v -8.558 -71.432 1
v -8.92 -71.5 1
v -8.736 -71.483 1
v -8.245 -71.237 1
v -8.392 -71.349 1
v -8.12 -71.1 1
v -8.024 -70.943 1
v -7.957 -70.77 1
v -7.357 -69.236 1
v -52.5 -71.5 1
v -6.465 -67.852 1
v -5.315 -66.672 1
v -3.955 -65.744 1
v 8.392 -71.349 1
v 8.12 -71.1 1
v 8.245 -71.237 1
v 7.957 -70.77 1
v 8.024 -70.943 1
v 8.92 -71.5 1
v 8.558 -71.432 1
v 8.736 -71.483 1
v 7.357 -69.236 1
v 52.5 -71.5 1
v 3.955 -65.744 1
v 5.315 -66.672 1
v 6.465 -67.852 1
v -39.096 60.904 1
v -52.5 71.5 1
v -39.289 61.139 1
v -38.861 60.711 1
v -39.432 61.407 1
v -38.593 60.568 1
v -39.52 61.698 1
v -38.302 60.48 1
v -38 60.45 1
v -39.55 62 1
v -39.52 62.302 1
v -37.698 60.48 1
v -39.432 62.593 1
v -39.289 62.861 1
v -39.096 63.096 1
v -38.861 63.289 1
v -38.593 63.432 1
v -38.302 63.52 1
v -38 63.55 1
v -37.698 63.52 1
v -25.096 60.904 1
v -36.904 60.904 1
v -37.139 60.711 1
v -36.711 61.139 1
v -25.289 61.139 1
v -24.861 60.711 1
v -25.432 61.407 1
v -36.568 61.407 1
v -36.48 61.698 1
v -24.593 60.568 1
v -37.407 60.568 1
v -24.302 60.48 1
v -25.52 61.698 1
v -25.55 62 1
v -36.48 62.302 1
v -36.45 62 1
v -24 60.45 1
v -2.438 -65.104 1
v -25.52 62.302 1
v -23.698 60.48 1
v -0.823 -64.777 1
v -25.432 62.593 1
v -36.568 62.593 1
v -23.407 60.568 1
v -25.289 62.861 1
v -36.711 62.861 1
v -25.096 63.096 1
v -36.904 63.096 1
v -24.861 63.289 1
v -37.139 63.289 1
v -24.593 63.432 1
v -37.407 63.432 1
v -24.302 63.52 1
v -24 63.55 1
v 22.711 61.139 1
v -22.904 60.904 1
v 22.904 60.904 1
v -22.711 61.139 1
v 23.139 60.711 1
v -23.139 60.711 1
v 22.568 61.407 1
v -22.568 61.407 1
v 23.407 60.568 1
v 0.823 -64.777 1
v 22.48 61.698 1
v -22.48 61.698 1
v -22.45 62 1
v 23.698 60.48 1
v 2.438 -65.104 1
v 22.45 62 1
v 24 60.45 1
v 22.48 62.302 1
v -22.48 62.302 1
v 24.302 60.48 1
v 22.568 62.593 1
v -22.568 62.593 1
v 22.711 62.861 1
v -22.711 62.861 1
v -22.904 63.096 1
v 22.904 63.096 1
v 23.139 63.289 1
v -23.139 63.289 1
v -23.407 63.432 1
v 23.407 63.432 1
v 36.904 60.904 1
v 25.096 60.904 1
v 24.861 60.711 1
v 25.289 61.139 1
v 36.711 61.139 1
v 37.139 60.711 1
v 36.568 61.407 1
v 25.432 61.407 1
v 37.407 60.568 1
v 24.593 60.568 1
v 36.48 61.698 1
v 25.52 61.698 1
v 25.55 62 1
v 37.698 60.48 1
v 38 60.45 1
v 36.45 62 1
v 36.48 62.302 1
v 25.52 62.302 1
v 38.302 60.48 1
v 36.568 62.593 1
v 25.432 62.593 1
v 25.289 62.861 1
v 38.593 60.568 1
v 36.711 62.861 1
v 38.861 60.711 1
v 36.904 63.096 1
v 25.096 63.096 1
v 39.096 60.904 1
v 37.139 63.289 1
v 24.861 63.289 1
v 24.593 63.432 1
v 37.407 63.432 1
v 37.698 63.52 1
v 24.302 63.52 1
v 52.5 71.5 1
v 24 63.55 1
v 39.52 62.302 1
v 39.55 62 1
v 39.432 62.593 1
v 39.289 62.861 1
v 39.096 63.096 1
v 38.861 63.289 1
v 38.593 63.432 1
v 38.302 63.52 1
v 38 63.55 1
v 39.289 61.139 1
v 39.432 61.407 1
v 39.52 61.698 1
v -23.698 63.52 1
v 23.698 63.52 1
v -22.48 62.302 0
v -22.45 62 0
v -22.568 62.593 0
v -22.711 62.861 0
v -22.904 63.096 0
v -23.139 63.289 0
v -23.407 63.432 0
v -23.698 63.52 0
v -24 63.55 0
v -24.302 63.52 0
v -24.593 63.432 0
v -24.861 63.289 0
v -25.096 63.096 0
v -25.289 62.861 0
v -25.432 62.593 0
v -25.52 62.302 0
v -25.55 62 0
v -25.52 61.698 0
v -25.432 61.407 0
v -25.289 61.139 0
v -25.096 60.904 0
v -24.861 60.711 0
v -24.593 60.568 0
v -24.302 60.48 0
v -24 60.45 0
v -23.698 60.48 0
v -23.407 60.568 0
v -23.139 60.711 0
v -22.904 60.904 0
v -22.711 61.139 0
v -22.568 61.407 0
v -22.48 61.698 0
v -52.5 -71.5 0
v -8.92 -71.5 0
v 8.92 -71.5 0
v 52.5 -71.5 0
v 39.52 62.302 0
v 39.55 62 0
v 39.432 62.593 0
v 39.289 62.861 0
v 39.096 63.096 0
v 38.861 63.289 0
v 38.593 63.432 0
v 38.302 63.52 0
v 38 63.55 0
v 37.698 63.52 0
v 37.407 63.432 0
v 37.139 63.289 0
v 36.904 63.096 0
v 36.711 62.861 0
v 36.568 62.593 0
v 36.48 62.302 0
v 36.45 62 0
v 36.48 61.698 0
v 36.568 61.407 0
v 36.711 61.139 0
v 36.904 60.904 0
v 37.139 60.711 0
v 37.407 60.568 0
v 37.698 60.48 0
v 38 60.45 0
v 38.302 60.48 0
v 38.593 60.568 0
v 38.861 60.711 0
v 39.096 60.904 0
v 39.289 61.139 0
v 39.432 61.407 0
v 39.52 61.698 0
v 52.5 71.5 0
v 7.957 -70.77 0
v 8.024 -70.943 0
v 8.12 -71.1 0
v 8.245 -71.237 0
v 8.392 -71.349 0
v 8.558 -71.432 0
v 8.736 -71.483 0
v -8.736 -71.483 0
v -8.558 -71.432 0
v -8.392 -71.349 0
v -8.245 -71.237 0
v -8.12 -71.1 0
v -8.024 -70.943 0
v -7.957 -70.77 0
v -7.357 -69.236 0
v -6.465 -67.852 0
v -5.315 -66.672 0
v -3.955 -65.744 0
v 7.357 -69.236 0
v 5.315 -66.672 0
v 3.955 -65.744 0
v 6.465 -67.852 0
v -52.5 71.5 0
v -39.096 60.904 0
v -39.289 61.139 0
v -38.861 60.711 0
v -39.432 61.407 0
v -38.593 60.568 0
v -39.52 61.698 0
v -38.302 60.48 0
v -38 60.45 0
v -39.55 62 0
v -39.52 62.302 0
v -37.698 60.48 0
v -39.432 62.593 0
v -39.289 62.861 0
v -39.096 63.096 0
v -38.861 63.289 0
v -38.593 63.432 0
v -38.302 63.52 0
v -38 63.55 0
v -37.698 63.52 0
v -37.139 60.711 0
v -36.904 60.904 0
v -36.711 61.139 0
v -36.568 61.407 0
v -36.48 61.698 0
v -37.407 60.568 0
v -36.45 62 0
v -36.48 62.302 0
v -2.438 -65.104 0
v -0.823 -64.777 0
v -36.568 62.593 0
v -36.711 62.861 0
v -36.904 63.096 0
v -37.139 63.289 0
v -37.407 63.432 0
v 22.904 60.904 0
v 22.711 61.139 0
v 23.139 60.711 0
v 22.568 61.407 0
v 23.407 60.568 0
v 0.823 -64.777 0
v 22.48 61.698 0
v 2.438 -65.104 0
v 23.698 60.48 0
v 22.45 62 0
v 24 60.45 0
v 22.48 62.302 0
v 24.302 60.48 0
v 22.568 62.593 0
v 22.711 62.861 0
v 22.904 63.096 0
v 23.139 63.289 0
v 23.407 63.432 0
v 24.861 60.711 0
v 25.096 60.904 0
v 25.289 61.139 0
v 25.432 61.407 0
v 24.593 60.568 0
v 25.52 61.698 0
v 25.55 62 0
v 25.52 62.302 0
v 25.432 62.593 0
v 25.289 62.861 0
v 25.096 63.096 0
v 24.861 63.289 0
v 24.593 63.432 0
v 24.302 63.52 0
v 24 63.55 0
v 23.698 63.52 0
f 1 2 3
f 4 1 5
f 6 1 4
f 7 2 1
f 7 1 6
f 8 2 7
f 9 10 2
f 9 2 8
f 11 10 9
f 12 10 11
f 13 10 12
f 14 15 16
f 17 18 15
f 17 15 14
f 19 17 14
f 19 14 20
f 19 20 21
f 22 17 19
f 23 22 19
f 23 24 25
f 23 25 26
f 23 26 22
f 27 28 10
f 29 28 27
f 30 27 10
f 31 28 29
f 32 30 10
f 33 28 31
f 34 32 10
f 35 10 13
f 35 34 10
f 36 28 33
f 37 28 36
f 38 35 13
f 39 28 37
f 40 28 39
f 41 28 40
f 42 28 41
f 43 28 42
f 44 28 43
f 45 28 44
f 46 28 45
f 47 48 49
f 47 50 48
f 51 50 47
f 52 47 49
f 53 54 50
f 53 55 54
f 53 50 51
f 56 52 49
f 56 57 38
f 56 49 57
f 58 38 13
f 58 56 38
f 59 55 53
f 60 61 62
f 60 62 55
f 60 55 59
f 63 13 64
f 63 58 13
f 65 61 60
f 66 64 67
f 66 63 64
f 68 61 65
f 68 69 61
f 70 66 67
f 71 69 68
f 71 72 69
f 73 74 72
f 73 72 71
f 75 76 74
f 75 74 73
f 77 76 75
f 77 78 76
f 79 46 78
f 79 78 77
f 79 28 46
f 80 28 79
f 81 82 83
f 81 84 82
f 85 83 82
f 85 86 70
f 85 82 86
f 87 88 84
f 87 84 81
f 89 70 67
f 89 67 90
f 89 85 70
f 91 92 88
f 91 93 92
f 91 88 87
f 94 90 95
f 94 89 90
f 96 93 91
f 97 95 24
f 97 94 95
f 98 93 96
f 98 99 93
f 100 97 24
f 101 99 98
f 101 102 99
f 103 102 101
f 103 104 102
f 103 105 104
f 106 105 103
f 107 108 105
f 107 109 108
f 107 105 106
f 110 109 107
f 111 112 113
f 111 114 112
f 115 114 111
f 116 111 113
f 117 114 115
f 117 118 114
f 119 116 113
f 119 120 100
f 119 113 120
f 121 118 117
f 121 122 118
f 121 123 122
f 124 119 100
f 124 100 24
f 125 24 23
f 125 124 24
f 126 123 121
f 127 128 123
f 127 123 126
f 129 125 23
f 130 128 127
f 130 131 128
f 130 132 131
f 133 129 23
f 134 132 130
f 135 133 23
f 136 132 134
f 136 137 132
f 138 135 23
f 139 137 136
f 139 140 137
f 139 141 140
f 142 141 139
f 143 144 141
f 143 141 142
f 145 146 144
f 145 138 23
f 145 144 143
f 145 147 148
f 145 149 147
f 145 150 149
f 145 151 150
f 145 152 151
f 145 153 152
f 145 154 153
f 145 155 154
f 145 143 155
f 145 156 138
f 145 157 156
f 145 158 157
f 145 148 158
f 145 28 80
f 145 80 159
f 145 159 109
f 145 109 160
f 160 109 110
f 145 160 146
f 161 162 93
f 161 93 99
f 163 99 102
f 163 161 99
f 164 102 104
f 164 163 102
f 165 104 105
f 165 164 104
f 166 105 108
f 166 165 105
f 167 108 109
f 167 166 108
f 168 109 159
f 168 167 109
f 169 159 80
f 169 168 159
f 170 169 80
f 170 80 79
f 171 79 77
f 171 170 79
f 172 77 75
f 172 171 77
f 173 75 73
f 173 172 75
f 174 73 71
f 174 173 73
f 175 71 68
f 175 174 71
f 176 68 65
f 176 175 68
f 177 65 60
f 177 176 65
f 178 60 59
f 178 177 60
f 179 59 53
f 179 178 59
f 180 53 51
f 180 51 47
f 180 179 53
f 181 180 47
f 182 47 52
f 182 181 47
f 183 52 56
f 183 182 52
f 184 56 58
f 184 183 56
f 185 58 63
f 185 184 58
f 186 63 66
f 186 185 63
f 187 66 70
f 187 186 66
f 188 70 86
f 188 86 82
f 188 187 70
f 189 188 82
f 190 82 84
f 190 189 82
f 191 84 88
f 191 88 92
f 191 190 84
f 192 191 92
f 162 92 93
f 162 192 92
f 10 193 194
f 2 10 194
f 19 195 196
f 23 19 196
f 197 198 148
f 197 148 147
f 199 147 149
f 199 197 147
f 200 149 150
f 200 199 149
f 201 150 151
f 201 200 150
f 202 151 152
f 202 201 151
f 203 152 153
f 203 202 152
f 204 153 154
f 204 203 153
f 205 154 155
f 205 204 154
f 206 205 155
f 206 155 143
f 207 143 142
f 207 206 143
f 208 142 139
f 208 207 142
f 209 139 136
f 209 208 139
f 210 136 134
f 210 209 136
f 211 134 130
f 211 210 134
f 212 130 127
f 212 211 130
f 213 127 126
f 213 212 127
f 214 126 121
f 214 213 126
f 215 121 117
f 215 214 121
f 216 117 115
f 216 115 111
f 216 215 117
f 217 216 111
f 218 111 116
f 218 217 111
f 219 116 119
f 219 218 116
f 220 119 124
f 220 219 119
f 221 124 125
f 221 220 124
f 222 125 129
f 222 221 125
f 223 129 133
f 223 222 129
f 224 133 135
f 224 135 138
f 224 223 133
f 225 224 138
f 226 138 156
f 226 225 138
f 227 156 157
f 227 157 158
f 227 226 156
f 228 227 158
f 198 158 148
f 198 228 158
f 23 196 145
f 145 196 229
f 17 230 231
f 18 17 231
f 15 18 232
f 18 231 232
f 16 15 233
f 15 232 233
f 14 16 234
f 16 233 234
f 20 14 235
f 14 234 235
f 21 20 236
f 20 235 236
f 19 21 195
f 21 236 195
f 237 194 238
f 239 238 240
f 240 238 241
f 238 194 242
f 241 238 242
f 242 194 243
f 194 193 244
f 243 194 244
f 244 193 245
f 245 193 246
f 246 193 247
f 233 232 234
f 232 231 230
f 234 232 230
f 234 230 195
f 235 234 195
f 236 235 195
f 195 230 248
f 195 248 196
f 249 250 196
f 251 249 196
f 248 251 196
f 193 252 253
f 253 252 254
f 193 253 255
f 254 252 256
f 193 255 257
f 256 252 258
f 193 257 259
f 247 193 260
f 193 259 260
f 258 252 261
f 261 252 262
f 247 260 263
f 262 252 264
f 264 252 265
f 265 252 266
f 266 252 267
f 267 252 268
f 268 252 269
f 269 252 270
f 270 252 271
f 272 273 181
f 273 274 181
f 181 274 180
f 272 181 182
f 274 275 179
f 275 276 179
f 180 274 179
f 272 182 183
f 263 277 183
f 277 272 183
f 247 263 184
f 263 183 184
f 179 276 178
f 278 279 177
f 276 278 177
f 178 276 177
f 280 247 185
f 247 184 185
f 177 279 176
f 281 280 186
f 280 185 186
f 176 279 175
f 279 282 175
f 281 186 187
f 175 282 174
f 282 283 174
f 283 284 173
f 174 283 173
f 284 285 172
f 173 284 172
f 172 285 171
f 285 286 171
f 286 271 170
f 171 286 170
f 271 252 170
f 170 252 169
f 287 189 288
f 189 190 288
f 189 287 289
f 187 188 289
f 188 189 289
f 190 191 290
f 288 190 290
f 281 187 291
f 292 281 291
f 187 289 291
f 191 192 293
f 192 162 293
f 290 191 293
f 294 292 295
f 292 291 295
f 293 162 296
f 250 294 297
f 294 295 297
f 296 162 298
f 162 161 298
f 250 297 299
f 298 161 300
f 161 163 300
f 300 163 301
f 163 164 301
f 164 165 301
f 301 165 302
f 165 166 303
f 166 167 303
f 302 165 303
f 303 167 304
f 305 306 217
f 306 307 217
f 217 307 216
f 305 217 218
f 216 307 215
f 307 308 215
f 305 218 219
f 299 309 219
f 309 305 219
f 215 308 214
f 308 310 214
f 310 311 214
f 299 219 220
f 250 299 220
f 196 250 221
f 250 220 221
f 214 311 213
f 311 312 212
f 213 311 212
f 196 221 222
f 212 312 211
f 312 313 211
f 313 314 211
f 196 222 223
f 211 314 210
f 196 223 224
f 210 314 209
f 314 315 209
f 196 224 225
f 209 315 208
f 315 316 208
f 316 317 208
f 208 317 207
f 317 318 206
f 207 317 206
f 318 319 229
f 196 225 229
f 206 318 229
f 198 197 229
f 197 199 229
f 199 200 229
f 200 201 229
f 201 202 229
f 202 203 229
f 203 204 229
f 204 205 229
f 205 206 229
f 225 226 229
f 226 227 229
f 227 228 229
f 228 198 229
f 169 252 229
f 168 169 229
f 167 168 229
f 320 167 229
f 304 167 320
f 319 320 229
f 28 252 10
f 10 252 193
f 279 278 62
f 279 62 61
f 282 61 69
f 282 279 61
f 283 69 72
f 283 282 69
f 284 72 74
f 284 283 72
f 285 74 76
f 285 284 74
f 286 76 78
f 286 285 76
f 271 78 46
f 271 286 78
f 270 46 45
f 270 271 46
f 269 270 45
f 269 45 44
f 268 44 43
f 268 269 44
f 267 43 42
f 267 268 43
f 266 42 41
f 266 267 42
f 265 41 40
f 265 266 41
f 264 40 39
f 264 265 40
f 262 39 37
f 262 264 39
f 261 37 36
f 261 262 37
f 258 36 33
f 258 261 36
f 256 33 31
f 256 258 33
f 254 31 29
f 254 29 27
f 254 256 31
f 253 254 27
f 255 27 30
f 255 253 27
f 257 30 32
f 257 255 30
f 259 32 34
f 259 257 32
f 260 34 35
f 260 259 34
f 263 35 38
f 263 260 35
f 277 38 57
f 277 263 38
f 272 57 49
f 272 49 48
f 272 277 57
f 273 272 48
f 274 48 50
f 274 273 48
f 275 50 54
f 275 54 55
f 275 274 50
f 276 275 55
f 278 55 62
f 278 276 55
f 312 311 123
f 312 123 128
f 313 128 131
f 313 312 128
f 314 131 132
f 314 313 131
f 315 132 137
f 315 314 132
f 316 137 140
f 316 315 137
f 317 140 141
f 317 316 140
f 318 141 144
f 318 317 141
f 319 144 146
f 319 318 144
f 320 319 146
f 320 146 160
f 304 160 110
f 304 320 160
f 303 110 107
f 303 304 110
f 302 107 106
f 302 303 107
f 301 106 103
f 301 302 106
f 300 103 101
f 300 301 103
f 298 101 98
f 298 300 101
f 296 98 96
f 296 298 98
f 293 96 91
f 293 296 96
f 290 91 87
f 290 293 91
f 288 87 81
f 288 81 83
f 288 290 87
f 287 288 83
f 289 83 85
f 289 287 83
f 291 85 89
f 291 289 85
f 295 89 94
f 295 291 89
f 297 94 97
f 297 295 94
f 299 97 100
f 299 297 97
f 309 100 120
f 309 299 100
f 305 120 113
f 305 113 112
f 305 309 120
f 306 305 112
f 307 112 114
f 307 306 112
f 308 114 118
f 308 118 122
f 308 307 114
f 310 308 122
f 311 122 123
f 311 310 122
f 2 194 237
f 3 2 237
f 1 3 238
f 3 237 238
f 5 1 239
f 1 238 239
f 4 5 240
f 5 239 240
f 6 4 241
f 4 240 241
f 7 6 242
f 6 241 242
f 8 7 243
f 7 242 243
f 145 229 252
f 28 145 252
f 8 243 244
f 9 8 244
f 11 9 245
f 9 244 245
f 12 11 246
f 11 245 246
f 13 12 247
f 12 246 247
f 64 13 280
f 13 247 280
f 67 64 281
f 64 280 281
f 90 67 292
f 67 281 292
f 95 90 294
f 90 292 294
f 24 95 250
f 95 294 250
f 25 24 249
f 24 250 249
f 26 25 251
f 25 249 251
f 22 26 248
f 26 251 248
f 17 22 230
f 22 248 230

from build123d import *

# Parameters (mm, degrees)
SKETCH_1_R      = 1.55
EXTRUDE_1_DEPTH = 1


with BuildPart() as part:
    # 草图1 → 凸台-拉伸1 (new body)
    with BuildSketch(Plane.XY):
        with BuildLine():
            Line((8.920204993, -71.5), (52.5, -71.5))
            Line((52.5, -71.5), (52.5, 71.5))
            Line((52.5, 71.5), (-52.5, 71.5))
            Line((-52.5, 71.5), (-52.5, -71.5))
            Line((-52.5, -71.5), (-8.920204993, -71.5))
            ThreePointArc((-8.920204993, -71.5), (-8.315996588, -71.296826332), (-7.957306659, -70.769864407))
            ThreePointArc((-7.957306659, -70.769864407), (0, -64.736088455), (7.957306659, -70.769864407))
            ThreePointArc((7.957306659, -70.769864407), (8.315996588, -71.296826332), (8.920204993, -71.5))
        make_face()
        with Locations((-38, 62)):
            Circle(SKETCH_1_R, mode=Mode.SUBTRACT)
        with Locations((-24, 62)):
            Circle(SKETCH_1_R, mode=Mode.SUBTRACT)
        with Locations((24, 62)):
            Circle(SKETCH_1_R, mode=Mode.SUBTRACT)
        with Locations((38, 62)):
            Circle(SKETCH_1_R, mode=Mode.SUBTRACT)
    extrude(amount=EXTRUDE_1_DEPTH)


solid = part.part
